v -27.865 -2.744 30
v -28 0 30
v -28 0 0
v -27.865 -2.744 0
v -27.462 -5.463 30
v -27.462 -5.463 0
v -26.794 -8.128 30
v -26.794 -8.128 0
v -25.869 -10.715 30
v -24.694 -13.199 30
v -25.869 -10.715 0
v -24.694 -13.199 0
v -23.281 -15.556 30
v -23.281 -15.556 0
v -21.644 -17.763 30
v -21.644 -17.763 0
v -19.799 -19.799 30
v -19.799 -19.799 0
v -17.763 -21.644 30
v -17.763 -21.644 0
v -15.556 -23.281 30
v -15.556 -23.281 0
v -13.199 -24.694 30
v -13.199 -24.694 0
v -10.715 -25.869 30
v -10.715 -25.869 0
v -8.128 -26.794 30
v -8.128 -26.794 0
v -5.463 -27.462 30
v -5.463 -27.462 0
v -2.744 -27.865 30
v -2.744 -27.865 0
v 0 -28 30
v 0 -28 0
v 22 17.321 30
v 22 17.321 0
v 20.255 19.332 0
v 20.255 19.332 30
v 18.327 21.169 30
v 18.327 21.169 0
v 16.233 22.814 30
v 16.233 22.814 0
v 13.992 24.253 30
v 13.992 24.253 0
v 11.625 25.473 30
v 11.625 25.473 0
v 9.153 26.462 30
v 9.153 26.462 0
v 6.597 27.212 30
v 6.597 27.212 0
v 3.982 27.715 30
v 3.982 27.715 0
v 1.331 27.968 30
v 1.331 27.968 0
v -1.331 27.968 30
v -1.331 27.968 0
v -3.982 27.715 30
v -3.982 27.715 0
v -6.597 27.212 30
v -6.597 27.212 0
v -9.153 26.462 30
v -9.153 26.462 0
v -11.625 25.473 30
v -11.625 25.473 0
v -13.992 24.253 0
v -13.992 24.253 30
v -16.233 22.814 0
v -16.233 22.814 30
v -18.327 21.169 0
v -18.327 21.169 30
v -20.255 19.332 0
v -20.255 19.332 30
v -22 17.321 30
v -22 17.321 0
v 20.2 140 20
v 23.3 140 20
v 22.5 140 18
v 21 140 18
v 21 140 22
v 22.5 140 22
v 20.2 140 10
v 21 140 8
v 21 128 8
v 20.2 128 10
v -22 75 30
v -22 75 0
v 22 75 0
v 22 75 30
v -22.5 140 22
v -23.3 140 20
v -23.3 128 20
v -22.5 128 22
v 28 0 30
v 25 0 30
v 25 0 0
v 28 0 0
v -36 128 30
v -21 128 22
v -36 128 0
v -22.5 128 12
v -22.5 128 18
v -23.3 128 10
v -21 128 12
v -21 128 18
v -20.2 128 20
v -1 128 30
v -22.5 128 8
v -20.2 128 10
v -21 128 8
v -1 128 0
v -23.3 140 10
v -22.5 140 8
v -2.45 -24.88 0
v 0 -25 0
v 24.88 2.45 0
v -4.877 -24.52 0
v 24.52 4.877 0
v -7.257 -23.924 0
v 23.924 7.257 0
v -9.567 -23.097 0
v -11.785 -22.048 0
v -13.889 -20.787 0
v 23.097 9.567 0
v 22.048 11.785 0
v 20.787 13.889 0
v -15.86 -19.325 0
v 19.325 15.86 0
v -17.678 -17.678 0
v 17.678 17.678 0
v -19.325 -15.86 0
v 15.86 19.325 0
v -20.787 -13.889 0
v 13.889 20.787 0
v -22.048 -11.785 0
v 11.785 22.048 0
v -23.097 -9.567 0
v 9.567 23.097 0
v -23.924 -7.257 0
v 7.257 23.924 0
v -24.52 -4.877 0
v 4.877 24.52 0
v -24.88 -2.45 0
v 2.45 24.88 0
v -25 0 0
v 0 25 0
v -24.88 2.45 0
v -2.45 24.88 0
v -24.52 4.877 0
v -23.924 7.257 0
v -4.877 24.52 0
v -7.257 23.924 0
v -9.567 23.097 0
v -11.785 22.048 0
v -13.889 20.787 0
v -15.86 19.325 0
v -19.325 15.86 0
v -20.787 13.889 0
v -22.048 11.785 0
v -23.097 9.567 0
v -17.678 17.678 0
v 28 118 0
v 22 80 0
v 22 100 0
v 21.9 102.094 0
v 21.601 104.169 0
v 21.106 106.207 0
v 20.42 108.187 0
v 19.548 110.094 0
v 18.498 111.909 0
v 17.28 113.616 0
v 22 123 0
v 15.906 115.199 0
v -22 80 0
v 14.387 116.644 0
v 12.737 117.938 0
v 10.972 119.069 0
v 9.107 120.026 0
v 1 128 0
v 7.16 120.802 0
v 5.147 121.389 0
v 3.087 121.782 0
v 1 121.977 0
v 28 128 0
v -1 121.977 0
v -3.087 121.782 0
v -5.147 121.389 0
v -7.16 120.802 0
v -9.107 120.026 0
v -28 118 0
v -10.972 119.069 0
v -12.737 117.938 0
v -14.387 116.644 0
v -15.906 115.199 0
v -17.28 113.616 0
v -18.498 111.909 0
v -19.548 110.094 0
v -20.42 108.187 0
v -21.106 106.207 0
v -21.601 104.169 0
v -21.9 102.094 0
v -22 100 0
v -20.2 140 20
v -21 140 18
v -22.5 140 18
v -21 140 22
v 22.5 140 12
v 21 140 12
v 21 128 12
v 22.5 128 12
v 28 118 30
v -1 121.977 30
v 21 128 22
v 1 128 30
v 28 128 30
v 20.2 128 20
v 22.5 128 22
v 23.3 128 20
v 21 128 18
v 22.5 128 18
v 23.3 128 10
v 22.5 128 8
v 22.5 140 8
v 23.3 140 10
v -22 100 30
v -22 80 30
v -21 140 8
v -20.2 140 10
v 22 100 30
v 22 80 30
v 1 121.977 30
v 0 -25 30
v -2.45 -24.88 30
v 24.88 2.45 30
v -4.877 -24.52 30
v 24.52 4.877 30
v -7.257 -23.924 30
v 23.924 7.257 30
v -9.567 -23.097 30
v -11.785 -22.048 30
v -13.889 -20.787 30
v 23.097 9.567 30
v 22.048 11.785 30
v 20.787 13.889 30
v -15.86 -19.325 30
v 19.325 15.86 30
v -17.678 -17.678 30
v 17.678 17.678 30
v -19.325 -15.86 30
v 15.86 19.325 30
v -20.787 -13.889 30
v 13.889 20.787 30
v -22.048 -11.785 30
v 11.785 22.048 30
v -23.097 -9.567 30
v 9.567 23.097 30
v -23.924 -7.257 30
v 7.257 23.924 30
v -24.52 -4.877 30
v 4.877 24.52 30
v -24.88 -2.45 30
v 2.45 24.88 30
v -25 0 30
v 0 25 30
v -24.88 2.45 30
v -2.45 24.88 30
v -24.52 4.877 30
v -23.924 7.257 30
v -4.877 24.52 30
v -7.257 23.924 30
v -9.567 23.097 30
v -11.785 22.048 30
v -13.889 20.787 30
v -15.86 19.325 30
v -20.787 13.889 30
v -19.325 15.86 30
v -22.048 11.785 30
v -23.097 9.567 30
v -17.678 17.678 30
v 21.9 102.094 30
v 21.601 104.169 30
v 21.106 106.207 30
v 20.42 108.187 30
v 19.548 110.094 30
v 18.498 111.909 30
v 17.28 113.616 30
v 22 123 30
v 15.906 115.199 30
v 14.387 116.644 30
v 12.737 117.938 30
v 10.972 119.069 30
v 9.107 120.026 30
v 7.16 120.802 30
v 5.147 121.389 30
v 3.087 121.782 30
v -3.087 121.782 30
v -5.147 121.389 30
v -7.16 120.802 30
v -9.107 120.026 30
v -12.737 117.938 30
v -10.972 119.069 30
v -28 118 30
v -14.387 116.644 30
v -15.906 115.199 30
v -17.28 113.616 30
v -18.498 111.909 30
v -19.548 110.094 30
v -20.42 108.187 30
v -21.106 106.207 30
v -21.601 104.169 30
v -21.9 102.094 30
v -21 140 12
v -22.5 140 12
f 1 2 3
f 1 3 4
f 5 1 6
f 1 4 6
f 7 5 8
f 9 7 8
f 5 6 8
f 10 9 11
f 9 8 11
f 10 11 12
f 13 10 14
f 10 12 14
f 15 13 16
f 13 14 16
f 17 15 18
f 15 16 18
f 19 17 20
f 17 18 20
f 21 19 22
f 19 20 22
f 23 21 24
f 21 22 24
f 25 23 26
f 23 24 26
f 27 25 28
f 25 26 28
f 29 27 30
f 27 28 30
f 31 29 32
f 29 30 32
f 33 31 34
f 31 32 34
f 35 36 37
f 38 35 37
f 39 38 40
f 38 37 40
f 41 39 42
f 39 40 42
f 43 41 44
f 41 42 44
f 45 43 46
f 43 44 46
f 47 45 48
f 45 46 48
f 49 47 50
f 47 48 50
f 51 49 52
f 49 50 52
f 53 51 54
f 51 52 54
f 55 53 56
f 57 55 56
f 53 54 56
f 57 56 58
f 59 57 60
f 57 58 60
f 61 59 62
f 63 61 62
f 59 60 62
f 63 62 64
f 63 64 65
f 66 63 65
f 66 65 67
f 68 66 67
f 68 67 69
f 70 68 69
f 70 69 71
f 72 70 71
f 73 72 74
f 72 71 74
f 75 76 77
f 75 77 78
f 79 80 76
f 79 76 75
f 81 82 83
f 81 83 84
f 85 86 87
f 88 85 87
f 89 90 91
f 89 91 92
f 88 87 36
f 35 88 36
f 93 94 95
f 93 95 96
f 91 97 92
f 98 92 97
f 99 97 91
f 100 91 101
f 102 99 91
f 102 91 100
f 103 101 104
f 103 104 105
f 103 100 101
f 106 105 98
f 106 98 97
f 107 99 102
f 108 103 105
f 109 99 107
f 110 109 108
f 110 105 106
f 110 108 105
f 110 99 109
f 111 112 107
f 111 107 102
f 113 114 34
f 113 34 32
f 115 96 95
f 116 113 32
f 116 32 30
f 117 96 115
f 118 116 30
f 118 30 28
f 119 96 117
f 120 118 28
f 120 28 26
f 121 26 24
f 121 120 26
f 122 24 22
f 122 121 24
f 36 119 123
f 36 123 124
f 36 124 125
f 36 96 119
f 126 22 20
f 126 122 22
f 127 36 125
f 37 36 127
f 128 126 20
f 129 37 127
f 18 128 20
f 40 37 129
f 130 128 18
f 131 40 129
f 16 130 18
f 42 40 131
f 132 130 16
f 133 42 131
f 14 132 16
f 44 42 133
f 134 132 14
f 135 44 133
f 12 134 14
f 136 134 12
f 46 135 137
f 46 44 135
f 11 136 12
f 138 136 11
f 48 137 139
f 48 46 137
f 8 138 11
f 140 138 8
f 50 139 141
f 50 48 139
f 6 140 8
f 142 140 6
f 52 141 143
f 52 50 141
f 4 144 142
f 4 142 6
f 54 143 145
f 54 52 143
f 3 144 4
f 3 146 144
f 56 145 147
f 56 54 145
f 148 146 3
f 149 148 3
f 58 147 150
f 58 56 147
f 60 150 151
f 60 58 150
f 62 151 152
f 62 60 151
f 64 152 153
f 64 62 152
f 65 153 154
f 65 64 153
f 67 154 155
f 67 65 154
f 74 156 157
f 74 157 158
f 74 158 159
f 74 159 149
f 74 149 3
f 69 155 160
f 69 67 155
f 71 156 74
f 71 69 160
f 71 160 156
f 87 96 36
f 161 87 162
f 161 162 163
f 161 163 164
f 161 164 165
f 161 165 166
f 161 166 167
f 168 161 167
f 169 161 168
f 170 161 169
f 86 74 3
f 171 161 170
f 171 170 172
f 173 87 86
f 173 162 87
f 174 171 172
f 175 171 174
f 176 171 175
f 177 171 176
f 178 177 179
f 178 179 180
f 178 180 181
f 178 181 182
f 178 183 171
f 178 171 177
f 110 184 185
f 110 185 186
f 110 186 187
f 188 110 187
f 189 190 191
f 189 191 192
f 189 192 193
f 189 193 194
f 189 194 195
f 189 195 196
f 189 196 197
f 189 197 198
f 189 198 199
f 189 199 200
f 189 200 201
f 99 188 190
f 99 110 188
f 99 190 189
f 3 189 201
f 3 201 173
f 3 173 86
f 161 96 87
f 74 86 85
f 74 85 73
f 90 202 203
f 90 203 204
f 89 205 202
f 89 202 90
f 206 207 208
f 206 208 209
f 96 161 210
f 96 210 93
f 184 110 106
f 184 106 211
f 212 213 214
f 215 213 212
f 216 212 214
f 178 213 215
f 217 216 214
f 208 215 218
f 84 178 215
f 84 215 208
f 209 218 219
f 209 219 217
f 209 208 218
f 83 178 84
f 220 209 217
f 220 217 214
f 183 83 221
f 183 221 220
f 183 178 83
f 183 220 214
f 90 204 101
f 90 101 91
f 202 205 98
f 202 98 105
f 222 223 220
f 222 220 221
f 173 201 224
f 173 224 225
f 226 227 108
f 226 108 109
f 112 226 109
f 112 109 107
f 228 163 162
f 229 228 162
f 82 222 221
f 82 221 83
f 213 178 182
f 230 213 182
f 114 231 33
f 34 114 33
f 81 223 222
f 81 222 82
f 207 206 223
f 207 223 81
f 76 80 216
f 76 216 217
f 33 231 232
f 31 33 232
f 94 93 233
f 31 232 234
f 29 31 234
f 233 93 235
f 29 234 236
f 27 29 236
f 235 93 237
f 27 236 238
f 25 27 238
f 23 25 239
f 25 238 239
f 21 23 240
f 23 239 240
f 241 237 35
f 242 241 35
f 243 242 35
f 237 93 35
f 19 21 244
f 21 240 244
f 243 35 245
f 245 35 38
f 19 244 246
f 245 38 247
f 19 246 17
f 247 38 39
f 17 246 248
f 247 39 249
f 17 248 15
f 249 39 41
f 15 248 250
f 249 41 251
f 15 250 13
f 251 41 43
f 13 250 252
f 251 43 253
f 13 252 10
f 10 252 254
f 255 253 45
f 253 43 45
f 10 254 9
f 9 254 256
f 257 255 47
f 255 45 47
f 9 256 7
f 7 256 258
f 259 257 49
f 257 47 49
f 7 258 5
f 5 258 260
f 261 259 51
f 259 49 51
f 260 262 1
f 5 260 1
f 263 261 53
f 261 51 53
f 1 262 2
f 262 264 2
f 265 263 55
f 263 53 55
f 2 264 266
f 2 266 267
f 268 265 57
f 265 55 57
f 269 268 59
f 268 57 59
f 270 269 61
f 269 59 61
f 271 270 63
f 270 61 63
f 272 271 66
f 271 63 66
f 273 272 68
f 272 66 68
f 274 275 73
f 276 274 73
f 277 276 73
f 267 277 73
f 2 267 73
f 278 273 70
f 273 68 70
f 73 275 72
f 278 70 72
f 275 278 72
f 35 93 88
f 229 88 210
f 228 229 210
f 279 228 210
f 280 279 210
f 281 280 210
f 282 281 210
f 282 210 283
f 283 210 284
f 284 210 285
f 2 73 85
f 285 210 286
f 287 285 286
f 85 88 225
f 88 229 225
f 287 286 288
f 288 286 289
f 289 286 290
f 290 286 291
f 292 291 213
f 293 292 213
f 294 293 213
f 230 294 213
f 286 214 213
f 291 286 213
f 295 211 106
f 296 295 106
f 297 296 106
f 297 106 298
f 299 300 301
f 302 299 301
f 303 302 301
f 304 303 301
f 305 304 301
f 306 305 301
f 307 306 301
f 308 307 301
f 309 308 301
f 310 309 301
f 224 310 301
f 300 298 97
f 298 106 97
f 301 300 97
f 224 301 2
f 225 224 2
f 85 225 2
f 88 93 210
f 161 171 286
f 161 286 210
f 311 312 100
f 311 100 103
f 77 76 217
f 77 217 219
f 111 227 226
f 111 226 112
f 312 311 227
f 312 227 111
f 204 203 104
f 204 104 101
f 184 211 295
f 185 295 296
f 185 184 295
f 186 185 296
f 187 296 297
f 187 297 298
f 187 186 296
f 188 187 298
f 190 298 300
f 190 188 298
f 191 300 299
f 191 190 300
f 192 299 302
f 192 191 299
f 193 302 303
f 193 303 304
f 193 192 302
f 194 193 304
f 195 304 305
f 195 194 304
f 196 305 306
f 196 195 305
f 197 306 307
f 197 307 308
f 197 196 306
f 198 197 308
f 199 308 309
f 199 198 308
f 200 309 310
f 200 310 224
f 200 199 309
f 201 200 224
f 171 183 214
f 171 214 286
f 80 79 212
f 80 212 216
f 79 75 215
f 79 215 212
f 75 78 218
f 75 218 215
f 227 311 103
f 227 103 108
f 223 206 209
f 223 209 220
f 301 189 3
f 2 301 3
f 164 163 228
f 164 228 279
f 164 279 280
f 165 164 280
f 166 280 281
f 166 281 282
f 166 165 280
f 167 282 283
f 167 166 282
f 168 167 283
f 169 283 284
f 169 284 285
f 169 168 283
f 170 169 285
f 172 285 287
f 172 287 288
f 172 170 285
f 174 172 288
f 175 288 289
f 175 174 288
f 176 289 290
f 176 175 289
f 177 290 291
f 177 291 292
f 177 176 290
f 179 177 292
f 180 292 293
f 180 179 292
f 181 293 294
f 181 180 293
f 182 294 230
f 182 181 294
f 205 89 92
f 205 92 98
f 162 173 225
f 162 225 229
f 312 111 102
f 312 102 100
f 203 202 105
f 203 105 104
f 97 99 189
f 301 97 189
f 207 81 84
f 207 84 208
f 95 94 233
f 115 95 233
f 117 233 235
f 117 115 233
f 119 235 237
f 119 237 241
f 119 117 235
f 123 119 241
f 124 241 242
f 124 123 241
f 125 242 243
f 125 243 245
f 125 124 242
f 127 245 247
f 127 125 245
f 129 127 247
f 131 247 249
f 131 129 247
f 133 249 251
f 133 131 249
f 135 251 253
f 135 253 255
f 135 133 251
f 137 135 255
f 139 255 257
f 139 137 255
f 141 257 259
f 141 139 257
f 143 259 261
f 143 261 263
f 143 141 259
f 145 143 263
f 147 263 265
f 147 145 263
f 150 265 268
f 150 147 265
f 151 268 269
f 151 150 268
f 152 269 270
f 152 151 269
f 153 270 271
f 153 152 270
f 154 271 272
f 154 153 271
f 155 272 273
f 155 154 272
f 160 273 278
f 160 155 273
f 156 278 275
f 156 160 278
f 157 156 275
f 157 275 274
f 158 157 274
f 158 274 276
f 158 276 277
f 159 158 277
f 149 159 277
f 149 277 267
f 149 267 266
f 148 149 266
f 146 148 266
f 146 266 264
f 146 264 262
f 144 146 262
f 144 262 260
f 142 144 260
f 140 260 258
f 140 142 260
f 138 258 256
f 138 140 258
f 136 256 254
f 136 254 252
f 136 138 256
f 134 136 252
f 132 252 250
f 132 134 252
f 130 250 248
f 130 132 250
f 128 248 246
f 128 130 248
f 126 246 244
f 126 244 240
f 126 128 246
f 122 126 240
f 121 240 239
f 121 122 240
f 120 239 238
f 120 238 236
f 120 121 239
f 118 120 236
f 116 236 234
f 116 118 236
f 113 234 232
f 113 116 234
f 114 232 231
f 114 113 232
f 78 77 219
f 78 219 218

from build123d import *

# Parameters (mm, degrees)
PAD_DEPTH    = 30
PAD001_DEPTH = 12


with BuildPart() as part:
    # Sketch → Pad (new body)
    with BuildSketch(Plane.XY):
        with BuildLine():
            ThreePointArc((25, 0), (-17.67767, 17.67767), (0, -25))
            Line((0, -25), (0, -28))
            ThreePointArc((-28, 1.4e-05), (-19.798995, -19.798985), (0, -28))
            Line((-28, 100.000014), (-28, 1.4e-05))
            Line((-28, 118.000014), (-28, 100.000014))
            Line((-36, 128), (-28, 118.000014))
            Line((-36, 128), (-1, 128))
            Line((-1, 128), (-1, 121.977261))
            ThreePointArc((-1, 121.977261), (-15.905969, 115.198689), (-22, 100.000014))
            Line((-22, 100.000014), (-22, 80))
            Line((-22, 80), (22, 80))
            Line((22, 100), (22, 80))
            ThreePointArc((22, 100), (15.905974, 115.198684), (1, 121.977261))
            Line((1, 128), (1, 121.977261))
            Line((1, 128), (28, 128))
            Line((28, 128), (22, 123))
            Line((22, 123), (28, 118))
            Line((28, 118), (28, 100))
            Line((28, 100), (28, 0))
            Line((25, 0), (28, 0))
        make_face()
        with BuildLine():
            ThreePointArc((22, 17.320508), (0, 28), (-22, 17.320508))
            Line((-22, 75), (-22, 17.320508))
            Line((-22, 75), (22, 75))
            Line((22, 75), (22, 17.320508))
        make_face(mode=Mode.SUBTRACT)
    extrude(amount=PAD_DEPTH)

    # Sketch001 (on Face13 of Pad) → Pad001 (join)
    with BuildSketch(Plane(origin=(0, 128, 0), x_dir=(-1, 0, 0), z_dir=(0, 1, 0))):
        Polygon((-22.5, 12), (-23.3, 10), (-22.5, 8), (-21, 8), (-20.2, 10), (-21, 12), align=None)
        Polygon((-22.5, 22), (-23.3, 20), (-22.5, 18), (-21, 18), (-20.2, 20), (-21, 22), align=None)
        Polygon((21, 12), (20.2, 10), (21, 8), (22.5, 8), (23.3, 10), (22.5, 12), align=None)
        Polygon((21, 22), (20.2, 20), (21, 18), (22.5, 18), (23.3, 20), (22.5, 22), align=None)
    extrude(amount=PAD001_DEPTH)


solid = part.part
